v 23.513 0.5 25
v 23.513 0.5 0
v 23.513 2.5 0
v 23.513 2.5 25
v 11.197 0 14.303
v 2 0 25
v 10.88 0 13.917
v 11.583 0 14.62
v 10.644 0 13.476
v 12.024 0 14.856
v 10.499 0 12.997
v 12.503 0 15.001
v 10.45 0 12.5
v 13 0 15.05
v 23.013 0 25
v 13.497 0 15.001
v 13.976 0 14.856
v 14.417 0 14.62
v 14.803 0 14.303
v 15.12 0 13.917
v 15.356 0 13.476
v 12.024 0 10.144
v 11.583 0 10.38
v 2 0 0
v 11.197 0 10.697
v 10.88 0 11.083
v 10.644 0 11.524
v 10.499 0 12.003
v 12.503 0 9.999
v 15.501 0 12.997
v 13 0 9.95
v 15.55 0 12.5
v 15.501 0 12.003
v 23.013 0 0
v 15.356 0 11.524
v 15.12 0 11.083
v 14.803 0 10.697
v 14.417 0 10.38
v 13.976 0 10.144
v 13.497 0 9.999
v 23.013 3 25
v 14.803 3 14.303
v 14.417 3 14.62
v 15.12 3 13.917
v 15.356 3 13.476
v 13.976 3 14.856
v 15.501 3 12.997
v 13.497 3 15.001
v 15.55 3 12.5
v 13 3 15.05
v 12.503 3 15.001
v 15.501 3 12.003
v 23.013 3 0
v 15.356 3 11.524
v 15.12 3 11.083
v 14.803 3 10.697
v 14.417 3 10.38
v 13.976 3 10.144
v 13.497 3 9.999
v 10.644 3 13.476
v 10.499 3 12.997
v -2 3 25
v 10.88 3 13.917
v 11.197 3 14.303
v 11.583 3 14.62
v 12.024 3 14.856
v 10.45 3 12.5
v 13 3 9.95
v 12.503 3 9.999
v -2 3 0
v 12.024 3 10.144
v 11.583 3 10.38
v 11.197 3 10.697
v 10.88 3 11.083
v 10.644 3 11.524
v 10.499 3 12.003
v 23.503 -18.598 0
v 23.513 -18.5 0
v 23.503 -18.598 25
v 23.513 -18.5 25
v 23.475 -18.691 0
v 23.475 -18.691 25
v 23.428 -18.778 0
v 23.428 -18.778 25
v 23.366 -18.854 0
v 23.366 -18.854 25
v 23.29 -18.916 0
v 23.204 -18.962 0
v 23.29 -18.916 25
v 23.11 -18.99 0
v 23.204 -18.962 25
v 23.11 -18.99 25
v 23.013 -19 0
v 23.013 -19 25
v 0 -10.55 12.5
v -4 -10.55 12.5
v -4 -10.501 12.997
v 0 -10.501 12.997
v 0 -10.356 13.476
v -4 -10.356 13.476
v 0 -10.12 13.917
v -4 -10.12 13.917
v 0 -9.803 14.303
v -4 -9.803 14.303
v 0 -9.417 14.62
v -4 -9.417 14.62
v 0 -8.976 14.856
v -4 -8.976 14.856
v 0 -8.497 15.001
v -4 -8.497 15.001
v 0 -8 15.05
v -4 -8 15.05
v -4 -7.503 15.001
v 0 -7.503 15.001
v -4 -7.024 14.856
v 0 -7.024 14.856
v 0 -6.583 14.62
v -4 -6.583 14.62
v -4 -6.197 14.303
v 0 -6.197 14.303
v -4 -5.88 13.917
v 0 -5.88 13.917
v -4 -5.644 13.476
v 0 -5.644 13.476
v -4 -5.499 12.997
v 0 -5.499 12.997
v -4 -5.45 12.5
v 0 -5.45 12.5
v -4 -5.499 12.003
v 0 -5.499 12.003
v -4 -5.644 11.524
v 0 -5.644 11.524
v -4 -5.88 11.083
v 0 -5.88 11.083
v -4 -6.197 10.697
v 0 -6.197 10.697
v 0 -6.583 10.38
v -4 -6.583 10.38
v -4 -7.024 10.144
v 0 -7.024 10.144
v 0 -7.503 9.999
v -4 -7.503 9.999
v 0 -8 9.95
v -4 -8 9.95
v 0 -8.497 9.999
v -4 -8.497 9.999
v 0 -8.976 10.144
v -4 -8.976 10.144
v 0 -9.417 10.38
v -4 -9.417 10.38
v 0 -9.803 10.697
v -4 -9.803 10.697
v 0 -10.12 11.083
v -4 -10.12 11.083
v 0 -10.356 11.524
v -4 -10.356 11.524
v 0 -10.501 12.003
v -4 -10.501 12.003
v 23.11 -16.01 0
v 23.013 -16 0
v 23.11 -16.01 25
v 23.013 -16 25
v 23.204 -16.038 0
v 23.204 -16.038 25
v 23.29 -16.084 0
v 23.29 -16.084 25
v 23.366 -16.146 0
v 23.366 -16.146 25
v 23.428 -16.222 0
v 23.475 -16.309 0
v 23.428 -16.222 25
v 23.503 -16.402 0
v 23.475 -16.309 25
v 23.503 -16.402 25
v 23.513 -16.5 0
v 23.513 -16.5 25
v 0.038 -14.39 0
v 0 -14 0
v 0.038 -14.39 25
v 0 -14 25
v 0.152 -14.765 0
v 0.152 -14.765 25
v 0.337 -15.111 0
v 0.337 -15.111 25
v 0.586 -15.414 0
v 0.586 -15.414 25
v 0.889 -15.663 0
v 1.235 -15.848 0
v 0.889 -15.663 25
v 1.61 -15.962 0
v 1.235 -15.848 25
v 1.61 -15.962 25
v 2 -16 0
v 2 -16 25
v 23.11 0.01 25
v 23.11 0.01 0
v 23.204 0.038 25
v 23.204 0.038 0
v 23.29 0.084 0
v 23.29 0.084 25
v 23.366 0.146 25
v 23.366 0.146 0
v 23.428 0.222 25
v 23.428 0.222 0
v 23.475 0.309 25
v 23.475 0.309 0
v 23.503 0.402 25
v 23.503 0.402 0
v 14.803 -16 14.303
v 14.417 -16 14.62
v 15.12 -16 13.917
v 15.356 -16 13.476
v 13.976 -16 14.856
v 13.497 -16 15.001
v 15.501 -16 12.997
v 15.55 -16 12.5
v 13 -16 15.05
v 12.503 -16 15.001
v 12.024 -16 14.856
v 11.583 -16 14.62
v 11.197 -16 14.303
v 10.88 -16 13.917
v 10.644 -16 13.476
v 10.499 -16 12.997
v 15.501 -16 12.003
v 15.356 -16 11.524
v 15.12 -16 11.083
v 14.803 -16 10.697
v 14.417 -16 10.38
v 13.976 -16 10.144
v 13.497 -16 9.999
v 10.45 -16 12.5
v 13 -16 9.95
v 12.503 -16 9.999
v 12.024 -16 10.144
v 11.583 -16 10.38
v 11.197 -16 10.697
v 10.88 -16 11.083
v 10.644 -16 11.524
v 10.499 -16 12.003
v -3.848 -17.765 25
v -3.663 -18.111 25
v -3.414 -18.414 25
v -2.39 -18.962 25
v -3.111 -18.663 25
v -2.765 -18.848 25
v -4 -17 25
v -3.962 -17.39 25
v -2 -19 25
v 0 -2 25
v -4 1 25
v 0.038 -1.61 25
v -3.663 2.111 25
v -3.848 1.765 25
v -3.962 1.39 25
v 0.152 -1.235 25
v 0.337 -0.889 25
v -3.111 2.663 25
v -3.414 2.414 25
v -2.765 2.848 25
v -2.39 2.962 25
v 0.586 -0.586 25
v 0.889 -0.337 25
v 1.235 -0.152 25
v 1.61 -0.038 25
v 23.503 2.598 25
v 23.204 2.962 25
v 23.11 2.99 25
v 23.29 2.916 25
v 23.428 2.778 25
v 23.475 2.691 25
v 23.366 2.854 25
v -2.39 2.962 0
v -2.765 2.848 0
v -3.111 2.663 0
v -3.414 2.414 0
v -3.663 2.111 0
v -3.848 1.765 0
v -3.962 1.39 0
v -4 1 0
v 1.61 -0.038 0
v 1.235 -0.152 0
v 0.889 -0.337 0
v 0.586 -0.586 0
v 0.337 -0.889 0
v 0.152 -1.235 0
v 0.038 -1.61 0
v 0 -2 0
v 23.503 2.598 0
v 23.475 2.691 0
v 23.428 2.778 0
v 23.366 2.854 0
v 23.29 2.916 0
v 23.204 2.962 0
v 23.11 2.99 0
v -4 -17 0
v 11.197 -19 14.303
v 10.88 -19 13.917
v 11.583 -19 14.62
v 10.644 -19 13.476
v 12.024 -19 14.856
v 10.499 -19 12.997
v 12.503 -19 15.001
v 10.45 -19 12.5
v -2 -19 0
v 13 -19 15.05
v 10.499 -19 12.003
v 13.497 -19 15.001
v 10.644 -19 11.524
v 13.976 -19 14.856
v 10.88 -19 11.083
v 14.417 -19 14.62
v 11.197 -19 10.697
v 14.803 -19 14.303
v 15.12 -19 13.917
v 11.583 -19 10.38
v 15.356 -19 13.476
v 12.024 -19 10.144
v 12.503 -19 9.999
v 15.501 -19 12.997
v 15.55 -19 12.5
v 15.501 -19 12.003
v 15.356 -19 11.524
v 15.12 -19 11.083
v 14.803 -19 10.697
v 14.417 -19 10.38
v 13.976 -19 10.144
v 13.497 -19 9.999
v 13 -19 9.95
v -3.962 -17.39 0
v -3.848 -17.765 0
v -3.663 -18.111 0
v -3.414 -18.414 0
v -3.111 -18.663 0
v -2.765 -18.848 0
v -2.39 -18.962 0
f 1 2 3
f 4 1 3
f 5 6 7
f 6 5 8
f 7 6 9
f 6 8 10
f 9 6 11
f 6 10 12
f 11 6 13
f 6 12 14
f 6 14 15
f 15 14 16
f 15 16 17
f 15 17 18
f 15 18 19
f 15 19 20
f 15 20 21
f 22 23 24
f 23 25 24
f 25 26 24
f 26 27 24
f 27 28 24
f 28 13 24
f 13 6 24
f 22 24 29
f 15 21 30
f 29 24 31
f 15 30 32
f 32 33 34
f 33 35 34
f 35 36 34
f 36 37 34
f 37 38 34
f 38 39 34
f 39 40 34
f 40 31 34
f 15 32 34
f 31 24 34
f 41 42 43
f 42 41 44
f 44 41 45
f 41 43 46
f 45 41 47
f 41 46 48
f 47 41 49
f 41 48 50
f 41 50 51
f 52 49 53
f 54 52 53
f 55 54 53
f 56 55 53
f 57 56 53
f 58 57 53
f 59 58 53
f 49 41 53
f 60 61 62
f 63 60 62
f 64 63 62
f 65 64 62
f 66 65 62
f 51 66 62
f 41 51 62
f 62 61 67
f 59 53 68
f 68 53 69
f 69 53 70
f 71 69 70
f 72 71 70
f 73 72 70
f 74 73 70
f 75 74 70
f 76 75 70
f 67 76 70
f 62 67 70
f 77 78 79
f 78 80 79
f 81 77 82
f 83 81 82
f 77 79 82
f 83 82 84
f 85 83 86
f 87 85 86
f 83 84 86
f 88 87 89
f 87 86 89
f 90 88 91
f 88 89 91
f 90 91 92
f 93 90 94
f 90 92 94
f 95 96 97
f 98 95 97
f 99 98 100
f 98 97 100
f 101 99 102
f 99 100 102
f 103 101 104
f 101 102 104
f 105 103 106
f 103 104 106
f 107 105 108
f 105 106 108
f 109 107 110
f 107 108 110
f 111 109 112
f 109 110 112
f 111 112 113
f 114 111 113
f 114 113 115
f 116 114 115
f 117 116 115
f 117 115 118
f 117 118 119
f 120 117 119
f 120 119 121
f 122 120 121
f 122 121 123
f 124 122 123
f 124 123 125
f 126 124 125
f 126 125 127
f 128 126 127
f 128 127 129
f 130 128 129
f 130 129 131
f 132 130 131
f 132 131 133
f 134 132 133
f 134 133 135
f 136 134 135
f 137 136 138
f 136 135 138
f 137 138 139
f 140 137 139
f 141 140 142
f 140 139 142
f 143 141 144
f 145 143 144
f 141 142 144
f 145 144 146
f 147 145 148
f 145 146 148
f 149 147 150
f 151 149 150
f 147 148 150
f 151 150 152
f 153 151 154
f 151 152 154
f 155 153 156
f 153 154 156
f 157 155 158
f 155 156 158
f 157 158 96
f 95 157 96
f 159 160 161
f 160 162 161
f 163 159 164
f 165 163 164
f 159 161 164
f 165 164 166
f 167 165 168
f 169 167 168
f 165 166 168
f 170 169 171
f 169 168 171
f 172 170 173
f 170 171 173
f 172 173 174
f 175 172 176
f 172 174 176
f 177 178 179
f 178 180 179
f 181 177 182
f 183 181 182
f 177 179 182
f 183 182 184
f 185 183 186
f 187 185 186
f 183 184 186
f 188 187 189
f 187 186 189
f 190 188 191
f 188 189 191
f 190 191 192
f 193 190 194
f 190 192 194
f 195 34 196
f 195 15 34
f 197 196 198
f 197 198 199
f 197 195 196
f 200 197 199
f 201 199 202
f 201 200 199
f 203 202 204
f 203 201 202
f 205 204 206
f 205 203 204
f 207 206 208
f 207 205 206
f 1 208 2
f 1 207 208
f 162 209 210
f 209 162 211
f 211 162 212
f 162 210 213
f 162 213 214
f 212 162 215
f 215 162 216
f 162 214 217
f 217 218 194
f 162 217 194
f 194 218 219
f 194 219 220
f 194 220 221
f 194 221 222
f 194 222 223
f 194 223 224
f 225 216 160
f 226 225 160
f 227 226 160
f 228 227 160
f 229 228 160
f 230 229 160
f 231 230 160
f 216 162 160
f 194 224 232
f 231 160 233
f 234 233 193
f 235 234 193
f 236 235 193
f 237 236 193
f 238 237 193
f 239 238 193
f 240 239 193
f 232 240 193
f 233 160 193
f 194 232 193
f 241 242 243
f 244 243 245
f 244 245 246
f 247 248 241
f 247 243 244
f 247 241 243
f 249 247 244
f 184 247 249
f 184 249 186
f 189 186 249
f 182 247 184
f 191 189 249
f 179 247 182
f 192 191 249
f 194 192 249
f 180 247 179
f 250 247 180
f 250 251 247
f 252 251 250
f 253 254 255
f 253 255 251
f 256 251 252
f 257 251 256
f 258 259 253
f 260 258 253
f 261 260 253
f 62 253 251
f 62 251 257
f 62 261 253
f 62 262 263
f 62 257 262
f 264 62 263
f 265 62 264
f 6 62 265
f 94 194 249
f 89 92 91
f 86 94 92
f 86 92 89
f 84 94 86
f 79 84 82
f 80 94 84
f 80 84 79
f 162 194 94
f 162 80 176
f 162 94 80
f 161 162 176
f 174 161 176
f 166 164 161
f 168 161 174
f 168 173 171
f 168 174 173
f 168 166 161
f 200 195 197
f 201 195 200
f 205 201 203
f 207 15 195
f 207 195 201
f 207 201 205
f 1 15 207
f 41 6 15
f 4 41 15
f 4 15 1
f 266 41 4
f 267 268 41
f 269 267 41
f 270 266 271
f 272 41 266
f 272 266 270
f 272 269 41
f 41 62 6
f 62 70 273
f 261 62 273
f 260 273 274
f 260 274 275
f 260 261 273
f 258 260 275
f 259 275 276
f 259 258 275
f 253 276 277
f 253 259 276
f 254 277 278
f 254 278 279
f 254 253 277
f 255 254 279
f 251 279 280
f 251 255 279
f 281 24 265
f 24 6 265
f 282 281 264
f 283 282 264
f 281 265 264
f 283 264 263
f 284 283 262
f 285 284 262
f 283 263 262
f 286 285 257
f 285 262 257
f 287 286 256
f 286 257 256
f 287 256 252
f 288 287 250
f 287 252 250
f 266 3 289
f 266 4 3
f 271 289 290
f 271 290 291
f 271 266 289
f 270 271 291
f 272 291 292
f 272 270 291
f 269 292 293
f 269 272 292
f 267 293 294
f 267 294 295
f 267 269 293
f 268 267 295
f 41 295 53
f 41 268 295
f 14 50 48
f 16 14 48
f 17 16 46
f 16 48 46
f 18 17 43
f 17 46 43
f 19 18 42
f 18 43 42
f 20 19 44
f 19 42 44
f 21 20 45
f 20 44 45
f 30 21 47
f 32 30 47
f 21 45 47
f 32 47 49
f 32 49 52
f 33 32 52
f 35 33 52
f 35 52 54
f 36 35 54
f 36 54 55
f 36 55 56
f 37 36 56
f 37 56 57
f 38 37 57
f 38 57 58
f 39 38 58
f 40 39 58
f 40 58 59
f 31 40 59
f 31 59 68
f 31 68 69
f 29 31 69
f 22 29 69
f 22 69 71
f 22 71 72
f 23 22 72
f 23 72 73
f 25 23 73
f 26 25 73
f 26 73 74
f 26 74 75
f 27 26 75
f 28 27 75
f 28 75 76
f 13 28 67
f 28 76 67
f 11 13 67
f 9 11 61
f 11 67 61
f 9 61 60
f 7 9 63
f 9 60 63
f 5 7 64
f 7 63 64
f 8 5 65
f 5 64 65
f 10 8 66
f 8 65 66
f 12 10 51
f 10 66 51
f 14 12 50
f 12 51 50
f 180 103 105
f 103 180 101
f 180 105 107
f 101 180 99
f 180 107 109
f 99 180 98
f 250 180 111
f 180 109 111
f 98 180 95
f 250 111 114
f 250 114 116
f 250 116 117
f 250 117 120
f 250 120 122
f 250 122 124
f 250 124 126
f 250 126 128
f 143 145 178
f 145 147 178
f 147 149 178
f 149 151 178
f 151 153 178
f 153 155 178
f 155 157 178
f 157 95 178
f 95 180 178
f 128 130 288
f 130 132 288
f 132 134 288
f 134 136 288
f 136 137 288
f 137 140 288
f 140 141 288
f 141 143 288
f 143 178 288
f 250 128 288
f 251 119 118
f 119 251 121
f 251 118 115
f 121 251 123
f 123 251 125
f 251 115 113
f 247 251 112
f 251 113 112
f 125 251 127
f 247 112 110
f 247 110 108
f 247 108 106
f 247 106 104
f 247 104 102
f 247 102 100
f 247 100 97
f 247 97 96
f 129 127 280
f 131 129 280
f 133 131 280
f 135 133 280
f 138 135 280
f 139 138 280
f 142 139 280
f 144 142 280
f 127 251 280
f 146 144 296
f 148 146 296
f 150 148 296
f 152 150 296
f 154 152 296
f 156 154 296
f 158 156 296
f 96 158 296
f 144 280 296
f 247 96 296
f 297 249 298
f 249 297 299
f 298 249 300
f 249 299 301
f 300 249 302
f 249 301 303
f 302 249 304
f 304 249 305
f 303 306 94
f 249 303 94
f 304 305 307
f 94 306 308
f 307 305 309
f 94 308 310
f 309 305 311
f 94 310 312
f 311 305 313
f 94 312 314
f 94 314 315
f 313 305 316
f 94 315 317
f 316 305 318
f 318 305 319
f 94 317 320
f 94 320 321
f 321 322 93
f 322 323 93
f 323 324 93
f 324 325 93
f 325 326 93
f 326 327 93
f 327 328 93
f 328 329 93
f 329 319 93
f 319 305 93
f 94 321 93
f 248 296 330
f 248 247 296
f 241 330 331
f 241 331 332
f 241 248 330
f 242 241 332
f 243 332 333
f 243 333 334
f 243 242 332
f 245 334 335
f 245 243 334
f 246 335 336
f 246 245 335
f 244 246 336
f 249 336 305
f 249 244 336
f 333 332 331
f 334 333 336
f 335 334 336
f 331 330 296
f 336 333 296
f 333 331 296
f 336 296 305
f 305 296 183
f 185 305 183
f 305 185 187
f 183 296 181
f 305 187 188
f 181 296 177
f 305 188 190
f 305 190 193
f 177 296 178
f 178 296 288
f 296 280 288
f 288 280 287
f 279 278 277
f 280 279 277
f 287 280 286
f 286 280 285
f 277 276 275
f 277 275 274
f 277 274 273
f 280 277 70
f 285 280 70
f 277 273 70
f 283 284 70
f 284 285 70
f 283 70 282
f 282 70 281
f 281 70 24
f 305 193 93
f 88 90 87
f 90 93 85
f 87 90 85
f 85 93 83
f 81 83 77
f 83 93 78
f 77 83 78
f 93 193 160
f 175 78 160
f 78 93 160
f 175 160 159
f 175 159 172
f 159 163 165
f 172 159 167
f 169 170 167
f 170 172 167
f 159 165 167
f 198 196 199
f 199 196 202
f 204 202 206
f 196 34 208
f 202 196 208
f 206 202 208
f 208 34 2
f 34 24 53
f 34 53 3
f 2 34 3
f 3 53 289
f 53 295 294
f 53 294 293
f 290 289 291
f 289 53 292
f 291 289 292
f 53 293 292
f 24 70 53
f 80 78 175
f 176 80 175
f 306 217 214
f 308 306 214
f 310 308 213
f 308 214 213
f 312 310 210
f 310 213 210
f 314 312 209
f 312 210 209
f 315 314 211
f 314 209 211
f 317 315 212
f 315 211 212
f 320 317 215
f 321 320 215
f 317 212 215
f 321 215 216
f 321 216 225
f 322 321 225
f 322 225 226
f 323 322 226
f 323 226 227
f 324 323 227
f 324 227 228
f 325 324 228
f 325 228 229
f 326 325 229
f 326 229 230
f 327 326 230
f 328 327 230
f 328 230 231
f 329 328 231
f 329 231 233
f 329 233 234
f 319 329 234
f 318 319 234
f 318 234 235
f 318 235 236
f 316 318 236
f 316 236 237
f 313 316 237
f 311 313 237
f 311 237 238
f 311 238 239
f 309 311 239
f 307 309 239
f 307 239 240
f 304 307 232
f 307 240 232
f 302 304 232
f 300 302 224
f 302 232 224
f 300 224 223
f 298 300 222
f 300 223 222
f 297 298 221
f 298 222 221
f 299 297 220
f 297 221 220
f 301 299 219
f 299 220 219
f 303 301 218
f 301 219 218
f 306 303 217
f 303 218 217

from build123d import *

# Parameters (mm, degrees)
EXTRUDE_1_DEPTH     = 25
SKETCH_2_R          = 2.55
CUT_EXTRUDE_1_DEPTH = 5
FILLET_1_R          = 2
FILLET_2_R          = 0.5
SKETCH_3_R          = 2.55
CUT_EXTRUDE_2_DEPTH = 35


with BuildPart() as part:
    # 草图1 → 凸台-拉伸1 (new body)
    with BuildSketch(Plane.XY):
        Polygon((0, 0), (23.51262021, 0), (23.51262021, 3), (0, 3), (-4, 3), (-4, -19), (0, -19), (23.51262021, -19), (23.51262021, -16), (0, -16), align=None)
    extrude(amount=EXTRUDE_1_DEPTH)

    # 草图2 → 切除-拉伸1 (cut)
    with BuildSketch(Plane.ZY.offset(4)):
        with Locations(Location((12.5, -8, 0), (0, 0, 270))):
            Circle(SKETCH_2_R)
    extrude(amount=-CUT_EXTRUDE_1_DEPTH, mode=Mode.SUBTRACT)

    # 圆角1
    fillet_1_edges = [part.edges().sort_by_distance(p)[0] for p in [
        (0, -16, 12.5),
        (-4, -19, 12.5),
        (-4, 3, 12.5),
        (0, 0, 12.5),
    ]]
    fillet(fillet_1_edges, radius=FILLET_1_R)

    # 圆角2
    fillet_2_edges = [part.edges().sort_by_distance(p)[0] for p in [
        (23.51262021, -16, 12.5),
        (23.51262021, -19, 12.5),
        (23.51262021, 3, 12.5),
        (23.51262021, 0, 12.5),
    ]]
    fillet(fillet_2_edges, radius=FILLET_2_R)

    # 草图3 → 切除-拉伸2 (cut)
    with BuildSketch(Plane(origin=(0, 3, 0), x_dir=(1, 0, 0), z_dir=(0, 1, 0))):
        with Locations(Location((13, -12.5, 0), (0, 0, 270))):
            Circle(SKETCH_3_R)
    extrude(amount=-CUT_EXTRUDE_2_DEPTH, mode=Mode.SUBTRACT)


solid = part.part
